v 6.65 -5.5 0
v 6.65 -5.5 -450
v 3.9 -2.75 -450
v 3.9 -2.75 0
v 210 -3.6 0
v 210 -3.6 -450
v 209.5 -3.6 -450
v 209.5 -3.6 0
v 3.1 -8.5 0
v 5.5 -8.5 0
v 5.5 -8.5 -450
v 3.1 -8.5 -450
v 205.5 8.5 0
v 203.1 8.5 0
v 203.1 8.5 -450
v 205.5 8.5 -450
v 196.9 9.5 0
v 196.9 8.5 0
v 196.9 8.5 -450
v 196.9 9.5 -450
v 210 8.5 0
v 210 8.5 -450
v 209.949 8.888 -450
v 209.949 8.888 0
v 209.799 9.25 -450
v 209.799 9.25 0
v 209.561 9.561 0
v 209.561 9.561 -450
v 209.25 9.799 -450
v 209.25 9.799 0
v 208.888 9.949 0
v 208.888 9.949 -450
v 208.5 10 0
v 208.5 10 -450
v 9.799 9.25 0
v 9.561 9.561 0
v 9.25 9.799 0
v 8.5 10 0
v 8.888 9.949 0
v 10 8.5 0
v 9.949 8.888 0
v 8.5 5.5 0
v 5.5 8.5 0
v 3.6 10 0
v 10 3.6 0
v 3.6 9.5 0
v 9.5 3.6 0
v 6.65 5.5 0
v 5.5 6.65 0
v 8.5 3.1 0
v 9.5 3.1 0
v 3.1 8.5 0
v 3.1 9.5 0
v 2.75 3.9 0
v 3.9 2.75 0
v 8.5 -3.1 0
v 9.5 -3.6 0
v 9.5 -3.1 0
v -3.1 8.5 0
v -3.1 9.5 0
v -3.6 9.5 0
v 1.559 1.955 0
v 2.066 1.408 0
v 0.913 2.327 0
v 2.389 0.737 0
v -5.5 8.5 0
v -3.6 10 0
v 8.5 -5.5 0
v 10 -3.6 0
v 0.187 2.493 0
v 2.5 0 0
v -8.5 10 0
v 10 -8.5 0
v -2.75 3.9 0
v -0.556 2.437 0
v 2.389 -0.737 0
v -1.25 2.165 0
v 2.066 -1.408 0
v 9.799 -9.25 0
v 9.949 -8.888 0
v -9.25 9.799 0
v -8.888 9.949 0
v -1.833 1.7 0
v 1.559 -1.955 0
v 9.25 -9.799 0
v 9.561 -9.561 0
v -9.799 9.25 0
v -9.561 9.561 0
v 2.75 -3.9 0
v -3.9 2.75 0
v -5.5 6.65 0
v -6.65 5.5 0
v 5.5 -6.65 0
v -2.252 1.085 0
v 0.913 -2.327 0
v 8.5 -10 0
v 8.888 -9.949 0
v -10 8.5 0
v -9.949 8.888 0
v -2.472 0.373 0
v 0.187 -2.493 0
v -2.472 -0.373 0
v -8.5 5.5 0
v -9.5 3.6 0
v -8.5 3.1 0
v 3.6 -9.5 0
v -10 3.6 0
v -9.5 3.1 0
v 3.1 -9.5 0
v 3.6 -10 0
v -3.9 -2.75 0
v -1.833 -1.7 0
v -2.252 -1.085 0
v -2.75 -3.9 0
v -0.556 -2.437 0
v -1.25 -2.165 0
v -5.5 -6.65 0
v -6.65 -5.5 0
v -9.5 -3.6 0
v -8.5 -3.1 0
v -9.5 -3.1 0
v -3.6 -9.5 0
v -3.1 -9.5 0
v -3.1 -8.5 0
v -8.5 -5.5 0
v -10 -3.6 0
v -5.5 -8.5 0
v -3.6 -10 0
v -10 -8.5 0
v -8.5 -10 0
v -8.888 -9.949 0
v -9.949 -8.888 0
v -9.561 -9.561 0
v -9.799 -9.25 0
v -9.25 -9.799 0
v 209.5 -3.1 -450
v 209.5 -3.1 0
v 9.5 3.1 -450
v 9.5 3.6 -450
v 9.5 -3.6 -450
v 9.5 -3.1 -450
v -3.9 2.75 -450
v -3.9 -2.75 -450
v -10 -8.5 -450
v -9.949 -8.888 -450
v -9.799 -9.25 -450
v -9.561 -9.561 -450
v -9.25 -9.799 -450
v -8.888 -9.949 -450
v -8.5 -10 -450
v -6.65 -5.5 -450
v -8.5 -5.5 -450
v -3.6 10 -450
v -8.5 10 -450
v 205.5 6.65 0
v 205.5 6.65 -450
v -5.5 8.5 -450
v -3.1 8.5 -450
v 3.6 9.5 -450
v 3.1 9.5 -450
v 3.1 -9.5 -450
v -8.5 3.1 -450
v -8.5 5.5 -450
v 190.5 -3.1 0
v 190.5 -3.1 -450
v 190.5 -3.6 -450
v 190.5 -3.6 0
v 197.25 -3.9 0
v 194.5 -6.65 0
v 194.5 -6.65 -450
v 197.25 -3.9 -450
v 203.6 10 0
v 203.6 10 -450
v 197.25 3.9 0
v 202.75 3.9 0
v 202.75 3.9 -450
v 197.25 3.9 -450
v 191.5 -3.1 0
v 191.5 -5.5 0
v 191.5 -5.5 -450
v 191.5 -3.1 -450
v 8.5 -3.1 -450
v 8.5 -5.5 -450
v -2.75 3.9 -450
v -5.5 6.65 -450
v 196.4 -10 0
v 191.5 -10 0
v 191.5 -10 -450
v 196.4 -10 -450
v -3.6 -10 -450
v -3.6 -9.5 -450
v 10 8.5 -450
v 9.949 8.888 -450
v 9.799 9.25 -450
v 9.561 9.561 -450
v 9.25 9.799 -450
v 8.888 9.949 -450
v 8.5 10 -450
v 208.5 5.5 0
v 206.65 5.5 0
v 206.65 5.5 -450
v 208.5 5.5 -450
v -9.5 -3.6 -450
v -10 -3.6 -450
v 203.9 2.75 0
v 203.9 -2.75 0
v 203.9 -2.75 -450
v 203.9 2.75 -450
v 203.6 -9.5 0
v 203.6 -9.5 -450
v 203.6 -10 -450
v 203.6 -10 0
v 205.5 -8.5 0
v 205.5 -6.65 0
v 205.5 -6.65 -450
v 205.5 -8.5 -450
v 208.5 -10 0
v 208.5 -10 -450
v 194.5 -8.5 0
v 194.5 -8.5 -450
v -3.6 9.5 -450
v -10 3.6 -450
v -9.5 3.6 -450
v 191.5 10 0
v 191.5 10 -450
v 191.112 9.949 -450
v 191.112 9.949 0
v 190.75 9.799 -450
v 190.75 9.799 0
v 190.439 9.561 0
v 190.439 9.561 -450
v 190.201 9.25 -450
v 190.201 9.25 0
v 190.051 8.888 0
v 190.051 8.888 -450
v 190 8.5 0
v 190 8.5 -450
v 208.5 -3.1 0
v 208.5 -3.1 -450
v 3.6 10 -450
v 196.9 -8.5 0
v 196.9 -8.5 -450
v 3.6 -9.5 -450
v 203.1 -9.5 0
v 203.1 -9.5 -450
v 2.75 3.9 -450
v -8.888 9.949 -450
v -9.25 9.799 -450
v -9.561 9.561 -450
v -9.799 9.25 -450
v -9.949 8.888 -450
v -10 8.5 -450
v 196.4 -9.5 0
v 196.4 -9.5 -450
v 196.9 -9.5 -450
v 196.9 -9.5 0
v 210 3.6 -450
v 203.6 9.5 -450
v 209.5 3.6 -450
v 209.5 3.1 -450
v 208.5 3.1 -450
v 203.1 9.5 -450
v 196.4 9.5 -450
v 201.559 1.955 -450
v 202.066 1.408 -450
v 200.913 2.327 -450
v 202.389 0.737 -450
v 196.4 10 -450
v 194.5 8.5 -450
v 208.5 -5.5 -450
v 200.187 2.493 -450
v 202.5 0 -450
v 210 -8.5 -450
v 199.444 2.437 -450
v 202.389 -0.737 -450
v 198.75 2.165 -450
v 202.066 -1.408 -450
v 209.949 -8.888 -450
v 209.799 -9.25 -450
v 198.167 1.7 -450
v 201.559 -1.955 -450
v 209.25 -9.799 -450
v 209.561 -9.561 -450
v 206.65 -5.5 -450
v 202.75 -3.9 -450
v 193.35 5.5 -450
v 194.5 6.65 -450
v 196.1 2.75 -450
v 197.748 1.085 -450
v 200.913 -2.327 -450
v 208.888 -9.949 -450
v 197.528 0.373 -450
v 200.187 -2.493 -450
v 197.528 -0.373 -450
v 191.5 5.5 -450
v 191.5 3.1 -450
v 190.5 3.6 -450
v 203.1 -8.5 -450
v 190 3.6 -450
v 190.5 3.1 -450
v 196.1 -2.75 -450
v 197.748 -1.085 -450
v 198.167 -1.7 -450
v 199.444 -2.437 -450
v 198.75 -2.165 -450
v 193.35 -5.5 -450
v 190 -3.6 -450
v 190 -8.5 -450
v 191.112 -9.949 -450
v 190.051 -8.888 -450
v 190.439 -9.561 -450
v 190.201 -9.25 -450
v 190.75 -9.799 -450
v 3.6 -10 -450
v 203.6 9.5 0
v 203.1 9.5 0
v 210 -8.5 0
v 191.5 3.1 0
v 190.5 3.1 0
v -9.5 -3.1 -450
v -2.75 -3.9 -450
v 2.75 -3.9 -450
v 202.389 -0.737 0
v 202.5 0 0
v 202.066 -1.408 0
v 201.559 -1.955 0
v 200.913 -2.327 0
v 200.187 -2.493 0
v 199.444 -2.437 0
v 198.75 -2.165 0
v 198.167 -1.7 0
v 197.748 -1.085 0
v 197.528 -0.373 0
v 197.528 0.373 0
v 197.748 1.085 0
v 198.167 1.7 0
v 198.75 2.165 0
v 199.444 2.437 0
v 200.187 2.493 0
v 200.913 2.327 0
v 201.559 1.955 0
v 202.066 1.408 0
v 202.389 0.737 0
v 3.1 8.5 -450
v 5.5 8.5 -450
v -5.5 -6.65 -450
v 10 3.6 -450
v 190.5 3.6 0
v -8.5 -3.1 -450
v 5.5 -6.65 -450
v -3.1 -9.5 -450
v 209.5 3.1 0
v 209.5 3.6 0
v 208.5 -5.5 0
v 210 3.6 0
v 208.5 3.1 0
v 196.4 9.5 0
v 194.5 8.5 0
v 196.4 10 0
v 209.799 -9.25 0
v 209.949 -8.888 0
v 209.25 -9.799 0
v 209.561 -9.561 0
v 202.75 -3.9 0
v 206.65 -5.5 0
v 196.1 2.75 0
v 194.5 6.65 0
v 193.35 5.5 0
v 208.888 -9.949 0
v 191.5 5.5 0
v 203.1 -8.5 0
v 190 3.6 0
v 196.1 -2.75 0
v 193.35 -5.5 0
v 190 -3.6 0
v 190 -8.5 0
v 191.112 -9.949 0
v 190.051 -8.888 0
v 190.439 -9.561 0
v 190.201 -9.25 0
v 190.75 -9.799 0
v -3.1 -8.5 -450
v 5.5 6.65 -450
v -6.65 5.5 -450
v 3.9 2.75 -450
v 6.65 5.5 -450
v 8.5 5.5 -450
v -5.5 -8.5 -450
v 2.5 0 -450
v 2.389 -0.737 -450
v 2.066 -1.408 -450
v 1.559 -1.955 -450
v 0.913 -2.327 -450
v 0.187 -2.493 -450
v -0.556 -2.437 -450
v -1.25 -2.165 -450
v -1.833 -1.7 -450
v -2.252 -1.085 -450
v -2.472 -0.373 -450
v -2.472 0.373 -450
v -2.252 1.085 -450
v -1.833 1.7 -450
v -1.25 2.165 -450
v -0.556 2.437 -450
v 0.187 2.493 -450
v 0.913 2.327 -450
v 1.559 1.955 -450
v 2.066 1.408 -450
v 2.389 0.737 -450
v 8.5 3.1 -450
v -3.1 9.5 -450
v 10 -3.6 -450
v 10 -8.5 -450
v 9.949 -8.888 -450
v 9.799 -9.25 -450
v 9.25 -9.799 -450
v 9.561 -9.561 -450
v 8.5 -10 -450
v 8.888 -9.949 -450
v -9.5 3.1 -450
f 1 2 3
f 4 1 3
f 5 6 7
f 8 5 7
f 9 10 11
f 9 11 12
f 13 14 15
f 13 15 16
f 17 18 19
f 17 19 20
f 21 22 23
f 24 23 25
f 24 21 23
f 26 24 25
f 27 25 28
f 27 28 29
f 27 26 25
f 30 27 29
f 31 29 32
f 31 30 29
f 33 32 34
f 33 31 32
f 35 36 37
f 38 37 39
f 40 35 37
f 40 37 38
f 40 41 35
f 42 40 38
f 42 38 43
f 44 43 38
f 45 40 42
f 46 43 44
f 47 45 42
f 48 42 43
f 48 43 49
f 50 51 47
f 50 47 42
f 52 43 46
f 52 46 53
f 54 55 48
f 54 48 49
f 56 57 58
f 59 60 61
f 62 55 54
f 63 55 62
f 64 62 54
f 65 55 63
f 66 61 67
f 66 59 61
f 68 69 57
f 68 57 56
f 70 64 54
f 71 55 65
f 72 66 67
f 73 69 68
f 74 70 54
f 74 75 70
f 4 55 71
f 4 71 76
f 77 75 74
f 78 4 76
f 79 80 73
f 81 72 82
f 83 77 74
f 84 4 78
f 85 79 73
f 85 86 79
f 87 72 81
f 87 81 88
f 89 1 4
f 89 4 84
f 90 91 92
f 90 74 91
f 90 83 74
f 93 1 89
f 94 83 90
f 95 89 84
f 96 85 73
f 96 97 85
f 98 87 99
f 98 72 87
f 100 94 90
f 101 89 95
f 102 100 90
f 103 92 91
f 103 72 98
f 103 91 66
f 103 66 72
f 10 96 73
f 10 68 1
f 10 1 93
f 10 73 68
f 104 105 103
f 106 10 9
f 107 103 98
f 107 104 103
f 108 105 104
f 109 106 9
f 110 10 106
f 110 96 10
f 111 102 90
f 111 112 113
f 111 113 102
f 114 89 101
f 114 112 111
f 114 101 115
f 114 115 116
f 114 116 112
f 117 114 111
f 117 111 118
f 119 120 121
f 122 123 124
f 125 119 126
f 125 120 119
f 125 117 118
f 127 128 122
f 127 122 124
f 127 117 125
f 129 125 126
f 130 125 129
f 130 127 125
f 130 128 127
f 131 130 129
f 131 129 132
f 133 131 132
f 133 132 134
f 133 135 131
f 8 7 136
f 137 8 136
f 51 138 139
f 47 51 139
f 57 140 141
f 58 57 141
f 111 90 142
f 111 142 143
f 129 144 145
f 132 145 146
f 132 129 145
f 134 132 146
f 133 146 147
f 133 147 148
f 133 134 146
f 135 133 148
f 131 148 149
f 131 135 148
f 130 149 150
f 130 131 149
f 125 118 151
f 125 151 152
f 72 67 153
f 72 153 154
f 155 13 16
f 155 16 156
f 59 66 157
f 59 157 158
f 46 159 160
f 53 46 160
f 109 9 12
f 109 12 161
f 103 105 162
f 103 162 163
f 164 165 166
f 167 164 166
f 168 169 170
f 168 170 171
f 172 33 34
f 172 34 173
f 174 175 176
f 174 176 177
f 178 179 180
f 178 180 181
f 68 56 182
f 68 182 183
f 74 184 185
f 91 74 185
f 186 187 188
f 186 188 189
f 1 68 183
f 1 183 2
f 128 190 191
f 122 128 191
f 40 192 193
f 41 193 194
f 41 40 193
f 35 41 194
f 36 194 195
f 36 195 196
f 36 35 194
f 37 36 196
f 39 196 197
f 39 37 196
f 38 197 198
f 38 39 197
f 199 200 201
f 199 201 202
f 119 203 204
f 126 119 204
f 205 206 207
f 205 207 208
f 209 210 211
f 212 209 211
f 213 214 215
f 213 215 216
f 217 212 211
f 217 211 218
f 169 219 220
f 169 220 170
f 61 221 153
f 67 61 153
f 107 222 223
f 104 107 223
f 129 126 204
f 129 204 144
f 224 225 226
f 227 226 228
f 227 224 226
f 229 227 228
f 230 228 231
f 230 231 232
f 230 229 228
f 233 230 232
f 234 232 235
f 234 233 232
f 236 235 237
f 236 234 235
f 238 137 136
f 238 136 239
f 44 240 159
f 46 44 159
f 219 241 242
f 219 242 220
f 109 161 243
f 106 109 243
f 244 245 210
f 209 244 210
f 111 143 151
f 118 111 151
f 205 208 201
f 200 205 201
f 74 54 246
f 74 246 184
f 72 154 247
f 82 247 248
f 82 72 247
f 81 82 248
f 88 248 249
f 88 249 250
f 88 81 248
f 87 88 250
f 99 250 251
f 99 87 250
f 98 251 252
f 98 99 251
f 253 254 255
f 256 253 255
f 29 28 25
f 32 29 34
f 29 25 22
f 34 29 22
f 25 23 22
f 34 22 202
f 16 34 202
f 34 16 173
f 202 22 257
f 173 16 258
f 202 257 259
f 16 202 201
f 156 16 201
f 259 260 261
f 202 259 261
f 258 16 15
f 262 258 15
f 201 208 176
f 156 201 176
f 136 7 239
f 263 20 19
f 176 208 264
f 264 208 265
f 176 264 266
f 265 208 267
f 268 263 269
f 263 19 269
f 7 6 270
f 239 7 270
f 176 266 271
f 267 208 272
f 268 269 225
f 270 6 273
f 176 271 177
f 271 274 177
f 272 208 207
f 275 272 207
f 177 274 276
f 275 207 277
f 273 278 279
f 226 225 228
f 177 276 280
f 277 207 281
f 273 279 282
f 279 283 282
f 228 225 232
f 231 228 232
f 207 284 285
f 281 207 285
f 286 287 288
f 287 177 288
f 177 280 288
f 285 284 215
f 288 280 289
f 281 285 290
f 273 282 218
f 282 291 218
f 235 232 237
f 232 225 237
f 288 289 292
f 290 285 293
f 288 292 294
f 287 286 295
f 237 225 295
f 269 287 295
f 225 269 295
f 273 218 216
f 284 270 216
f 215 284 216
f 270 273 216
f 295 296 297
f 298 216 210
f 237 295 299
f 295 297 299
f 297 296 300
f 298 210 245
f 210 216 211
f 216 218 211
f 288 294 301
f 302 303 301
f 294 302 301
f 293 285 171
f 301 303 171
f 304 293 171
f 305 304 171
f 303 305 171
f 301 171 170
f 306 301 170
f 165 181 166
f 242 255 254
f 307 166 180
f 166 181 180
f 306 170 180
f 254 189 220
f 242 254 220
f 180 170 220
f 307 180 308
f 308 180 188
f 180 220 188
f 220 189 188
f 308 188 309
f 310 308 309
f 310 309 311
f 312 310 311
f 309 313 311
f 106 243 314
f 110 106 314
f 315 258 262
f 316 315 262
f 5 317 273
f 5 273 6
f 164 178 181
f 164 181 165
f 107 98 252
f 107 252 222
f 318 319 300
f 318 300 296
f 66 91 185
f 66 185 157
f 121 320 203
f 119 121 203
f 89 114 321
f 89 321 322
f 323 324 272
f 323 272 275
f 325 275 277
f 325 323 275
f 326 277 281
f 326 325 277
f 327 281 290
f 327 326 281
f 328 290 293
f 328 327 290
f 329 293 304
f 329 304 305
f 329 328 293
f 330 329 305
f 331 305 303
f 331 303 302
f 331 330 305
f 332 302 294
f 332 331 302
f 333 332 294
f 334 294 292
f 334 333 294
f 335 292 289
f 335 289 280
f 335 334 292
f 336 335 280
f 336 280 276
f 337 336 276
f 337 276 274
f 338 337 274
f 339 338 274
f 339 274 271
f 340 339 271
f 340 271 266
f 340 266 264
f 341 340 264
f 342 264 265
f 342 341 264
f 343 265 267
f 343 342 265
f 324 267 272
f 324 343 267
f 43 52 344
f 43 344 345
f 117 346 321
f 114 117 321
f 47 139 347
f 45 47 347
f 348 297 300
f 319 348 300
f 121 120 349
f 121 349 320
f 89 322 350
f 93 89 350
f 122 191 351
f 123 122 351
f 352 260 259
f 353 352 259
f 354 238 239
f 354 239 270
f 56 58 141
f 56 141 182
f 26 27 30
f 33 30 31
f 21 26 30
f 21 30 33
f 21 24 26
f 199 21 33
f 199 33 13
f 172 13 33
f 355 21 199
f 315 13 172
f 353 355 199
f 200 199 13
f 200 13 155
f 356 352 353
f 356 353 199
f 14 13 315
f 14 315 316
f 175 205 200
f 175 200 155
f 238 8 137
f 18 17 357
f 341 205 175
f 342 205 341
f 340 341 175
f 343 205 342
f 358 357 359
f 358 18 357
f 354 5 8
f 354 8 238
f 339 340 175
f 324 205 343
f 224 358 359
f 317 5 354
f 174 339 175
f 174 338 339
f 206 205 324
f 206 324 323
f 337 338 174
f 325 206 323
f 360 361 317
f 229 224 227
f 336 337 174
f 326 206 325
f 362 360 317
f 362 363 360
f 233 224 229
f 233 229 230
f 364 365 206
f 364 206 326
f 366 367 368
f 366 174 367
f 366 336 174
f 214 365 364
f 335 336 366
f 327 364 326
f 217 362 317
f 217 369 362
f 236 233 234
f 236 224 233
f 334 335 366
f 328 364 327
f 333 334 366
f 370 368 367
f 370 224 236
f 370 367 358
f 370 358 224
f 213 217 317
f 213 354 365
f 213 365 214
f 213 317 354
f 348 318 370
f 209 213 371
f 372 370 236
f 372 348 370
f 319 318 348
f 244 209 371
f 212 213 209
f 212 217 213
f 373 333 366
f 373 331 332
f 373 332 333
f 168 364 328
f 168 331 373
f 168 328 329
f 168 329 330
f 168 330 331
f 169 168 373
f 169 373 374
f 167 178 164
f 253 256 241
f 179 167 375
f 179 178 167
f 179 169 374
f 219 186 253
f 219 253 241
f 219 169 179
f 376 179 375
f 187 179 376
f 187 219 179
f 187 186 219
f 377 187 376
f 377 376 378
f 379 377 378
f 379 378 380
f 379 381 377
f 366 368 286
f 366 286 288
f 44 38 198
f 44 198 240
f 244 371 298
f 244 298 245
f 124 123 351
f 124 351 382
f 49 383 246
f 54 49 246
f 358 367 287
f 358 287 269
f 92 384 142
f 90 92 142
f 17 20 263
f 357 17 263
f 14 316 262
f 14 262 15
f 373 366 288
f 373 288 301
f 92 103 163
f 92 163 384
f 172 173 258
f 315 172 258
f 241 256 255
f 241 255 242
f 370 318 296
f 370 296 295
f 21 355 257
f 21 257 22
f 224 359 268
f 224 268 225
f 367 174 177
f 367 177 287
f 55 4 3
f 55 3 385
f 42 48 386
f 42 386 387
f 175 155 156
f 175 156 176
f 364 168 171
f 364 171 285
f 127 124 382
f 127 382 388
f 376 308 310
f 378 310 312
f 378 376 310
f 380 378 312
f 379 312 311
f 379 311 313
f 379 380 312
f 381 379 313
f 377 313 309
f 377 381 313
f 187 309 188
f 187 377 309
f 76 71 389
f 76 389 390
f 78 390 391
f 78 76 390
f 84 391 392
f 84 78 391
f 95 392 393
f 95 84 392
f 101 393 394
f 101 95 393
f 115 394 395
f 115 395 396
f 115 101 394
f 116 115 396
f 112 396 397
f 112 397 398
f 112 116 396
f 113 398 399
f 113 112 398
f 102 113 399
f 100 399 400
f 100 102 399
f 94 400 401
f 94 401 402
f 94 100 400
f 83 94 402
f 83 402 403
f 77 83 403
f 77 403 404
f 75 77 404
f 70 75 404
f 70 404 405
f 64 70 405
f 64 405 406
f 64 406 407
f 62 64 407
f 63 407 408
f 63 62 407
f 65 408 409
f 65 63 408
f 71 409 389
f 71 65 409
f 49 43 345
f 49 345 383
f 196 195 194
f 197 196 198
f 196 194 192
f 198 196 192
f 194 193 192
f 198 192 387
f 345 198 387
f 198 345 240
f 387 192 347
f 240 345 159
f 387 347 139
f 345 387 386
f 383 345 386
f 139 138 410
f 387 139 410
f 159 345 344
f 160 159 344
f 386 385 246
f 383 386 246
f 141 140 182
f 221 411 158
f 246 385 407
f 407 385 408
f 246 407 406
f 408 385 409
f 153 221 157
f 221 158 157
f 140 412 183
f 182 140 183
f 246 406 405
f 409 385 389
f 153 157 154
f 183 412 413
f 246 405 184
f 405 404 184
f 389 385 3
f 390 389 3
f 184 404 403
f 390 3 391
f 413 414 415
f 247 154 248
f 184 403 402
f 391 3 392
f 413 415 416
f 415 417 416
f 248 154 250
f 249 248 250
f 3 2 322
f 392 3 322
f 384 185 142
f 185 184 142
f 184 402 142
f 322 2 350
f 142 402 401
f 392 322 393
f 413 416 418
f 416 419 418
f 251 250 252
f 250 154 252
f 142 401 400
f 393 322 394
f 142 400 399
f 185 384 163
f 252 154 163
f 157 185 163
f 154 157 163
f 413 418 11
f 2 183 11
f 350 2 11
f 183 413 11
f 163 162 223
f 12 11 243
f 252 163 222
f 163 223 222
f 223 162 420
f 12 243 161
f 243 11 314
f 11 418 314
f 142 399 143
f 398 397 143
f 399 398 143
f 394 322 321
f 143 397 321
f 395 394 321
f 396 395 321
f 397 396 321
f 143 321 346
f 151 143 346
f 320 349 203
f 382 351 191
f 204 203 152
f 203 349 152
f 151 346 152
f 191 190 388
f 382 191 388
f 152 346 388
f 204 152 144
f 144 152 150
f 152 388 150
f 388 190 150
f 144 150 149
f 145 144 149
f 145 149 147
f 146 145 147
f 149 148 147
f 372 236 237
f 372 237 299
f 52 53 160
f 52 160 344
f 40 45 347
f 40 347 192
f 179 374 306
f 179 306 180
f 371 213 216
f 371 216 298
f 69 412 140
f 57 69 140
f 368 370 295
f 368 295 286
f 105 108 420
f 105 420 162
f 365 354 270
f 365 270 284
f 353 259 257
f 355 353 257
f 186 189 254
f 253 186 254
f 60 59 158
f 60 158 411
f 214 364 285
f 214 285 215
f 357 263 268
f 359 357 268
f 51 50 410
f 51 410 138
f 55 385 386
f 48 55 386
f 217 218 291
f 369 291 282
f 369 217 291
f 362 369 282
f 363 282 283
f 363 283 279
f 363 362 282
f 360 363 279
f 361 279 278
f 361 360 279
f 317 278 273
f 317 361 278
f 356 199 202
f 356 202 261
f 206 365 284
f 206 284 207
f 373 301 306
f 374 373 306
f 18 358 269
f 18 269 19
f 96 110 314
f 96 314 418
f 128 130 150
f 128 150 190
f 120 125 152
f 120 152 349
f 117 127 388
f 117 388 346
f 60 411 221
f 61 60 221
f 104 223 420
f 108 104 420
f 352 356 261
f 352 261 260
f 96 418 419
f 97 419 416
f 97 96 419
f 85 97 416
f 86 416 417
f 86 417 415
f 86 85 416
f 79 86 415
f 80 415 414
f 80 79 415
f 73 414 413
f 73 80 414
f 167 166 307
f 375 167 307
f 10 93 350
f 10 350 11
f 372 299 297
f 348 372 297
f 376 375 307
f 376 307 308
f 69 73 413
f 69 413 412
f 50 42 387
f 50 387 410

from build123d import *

# Parameters (mm, degrees)
SKETCH1_R                  = 2.5
F_20_X_20_X_R1_5_1_DEPTH   = 450
SKETCH1_ON_SEGMENT_2_R     = 2.5
F_20_X_20_X_R1_5_1_2_DEPTH = 450


with BuildPart() as part:
    # Sketch1 → 工业铝型材 20 X 20 X R1.5(1) (new body)
    with BuildSketch(Plane(origin=(0, 0, 0), x_dir=(1, 0, 0), z_dir=(0, 0, -1))):
        with BuildLine():
            Line((-3.6, 10), (-3.6, 9.5))
            Line((-3.6, 9.5), (-3.1, 9.5))
            Line((-3.1, 9.5), (-3.1, 8.5))
            Line((-3.1, 8.5), (-5.5, 8.5))
            Line((-5.5, 8.5), (-5.5, 6.65))
            Line((-5.5, 6.65), (-2.75, 3.9))
            Line((-2.75, 3.9), (2.75, 3.9))
            Line((2.75, 3.9), (5.5, 6.65))
            Line((5.5, 6.65), (5.5, 8.5))
            Line((5.5, 8.5), (3.1, 8.5))
            Line((3.1, 8.5), (3.1, 9.5))
            Line((3.1, 9.5), (3.6, 9.5))
            Line((3.6, 9.5), (3.6, 10))
            Line((3.6, 10), (8.5, 10))
            ThreePointArc((8.5, 10), (9.560660172, 9.560660172), (10, 8.5))
            Line((10, 8.5), (10, 3.6))
            Line((10, 3.6), (9.5, 3.6))
            Line((9.5, 3.6), (9.5, 3.1))
            Line((9.5, 3.1), (8.5, 3.1))
            Line((8.5, 3.1), (8.5, 5.5))
            Line((8.5, 5.5), (6.65, 5.5))
            Line((6.65, 5.5), (3.9, 2.75))
            Line((3.9, 2.75), (3.9, -2.75))
            Line((3.9, -2.75), (6.65, -5.5))
            Line((6.65, -5.5), (8.5, -5.5))
            Line((8.5, -5.5), (8.5, -3.1))
            Line((8.5, -3.1), (9.5, -3.1))
            Line((9.5, -3.1), (9.5, -3.6))
            Line((9.5, -3.6), (10, -3.6))
            Line((10, -3.6), (10, -8.5))
            ThreePointArc((10, -8.5), (9.560660172, -9.560660172), (8.5, -10))
            Line((8.5, -10), (3.6, -10))
            Line((3.6, -10), (3.6, -9.5))
            Line((3.6, -9.5), (3.1, -9.5))
            Line((3.1, -9.5), (3.1, -8.5))
            Line((3.1, -8.5), (5.5, -8.5))
            Line((5.5, -8.5), (5.5, -6.65))
            Line((5.5, -6.65), (2.75, -3.9))
            Line((2.75, -3.9), (-2.75, -3.9))
            Line((-2.75, -3.9), (-5.5, -6.65))
            Line((-5.5, -6.65), (-5.5, -8.5))
            Line((-5.5, -8.5), (-3.1, -8.5))
            Line((-3.1, -8.5), (-3.1, -9.5))
            Line((-3.1, -9.5), (-3.6, -9.5))
            Line((-3.6, -9.5), (-3.6, -10))
            Line((-3.6, -10), (-8.5, -10))
            ThreePointArc((-8.5, -10), (-9.560660172, -9.560660172), (-10, -8.5))
            Line((-10, -8.5), (-10, -3.6))
            Line((-10, -3.6), (-9.5, -3.6))
            Line((-9.5, -3.6), (-9.5, -3.1))
            Line((-9.5, -3.1), (-8.5, -3.1))
            Line((-8.5, -3.1), (-8.5, -5.5))
            Line((-8.5, -5.5), (-6.65, -5.5))
            Line((-6.65, -5.5), (-3.9, -2.75))
            Line((-3.9, -2.75), (-3.9, 2.75))
            Line((-3.9, 2.75), (-6.65, 5.5))
            Line((-6.65, 5.5), (-8.5, 5.5))
            Line((-8.5, 5.5), (-8.5, 3.1))
            Line((-8.5, 3.1), (-9.5, 3.1))
            Line((-9.5, 3.1), (-9.5, 3.6))
            Line((-9.5, 3.6), (-10, 3.6))
            Line((-10, 3.6), (-10, 8.5))
            ThreePointArc((-10, 8.5), (-9.560660172, 9.560660172), (-8.5, 10))
            Line((-8.5, 10), (-3.6, 10))
        make_face()
        Circle(SKETCH1_R, mode=Mode.SUBTRACT)
    extrude(amount=F_20_X_20_X_R1_5_1_DEPTH)


with BuildPart() as body_2:
    # Sketch1 on segment 2 (carried to segment 2) → 20 X 20 X R1.5_1 2 (new body)
    with BuildSketch(Plane(origin=(200, 0, 0), x_dir=(1, 0, 0), z_dir=(0, 0, -1))):
        with BuildLine():
            Line((-3.6, 10), (-3.6, 9.5))
            Line((-3.6, 9.5), (-3.1, 9.5))
            Line((-3.1, 9.5), (-3.1, 8.5))
            Line((-3.1, 8.5), (-5.5, 8.5))
            Line((-5.5, 8.5), (-5.5, 6.65))
            Line((-5.5, 6.65), (-2.75, 3.9))
            Line((-2.75, 3.9), (2.75, 3.9))
            Line((2.75, 3.9), (5.5, 6.65))
            Line((5.5, 6.65), (5.5, 8.5))
            Line((5.5, 8.5), (3.1, 8.5))
            Line((3.1, 8.5), (3.1, 9.5))
            Line((3.1, 9.5), (3.6, 9.5))
            Line((3.6, 9.5), (3.6, 10))
            Line((3.6, 10), (8.5, 10))
            ThreePointArc((8.5, 10), (9.560660172, 9.560660172), (10, 8.5))
            Line((10, 8.5), (10, 3.6))
            Line((10, 3.6), (9.5, 3.6))
            Line((9.5, 3.6), (9.5, 3.1))
            Line((9.5, 3.1), (8.5, 3.1))
            Line((8.5, 3.1), (8.5, 5.5))
            Line((8.5, 5.5), (6.65, 5.5))
            Line((6.65, 5.5), (3.9, 2.75))
            Line((3.9, 2.75), (3.9, -2.75))
            Line((3.9, -2.75), (6.65, -5.5))
            Line((6.65, -5.5), (8.5, -5.5))
            Line((8.5, -5.5), (8.5, -3.1))
            Line((8.5, -3.1), (9.5, -3.1))
            Line((9.5, -3.1), (9.5, -3.6))
            Line((9.5, -3.6), (10, -3.6))
            Line((10, -3.6), (10, -8.5))
            ThreePointArc((10, -8.5), (9.560660172, -9.560660172), (8.5, -10))
            Line((8.5, -10), (3.6, -10))
            Line((3.6, -10), (3.6, -9.5))
            Line((3.6, -9.5), (3.1, -9.5))
            Line((3.1, -9.5), (3.1, -8.5))
            Line((3.1, -8.5), (5.5, -8.5))
            Line((5.5, -8.5), (5.5, -6.65))
            Line((5.5, -6.65), (2.75, -3.9))
            Line((2.75, -3.9), (-2.75, -3.9))
            Line((-2.75, -3.9), (-5.5, -6.65))
            Line((-5.5, -6.65), (-5.5, -8.5))
            Line((-5.5, -8.5), (-3.1, -8.5))
            Line((-3.1, -8.5), (-3.1, -9.5))
            Line((-3.1, -9.5), (-3.6, -9.5))
            Line((-3.6, -9.5), (-3.6, -10))
            Line((-3.6, -10), (-8.5, -10))
            ThreePointArc((-8.5, -10), (-9.560660172, -9.560660172), (-10, -8.5))
            Line((-10, -8.5), (-10, -3.6))
            Line((-10, -3.6), (-9.5, -3.6))
            Line((-9.5, -3.6), (-9.5, -3.1))
            Line((-9.5, -3.1), (-8.5, -3.1))
            Line((-8.5, -3.1), (-8.5, -5.5))
            Line((-8.5, -5.5), (-6.65, -5.5))
            Line((-6.65, -5.5), (-3.9, -2.75))
            Line((-3.9, -2.75), (-3.9, 2.75))
            Line((-3.9, 2.75), (-6.65, 5.5))
            Line((-6.65, 5.5), (-8.5, 5.5))
            Line((-8.5, 5.5), (-8.5, 3.1))
            Line((-8.5, 3.1), (-9.5, 3.1))
            Line((-9.5, 3.1), (-9.5, 3.6))
            Line((-9.5, 3.6), (-10, 3.6))
            Line((-10, 3.6), (-10, 8.5))
            ThreePointArc((-10, 8.5), (-9.560660172, 9.560660172), (-8.5, 10))
            Line((-8.5, 10), (-3.6, 10))
        make_face()
        Circle(SKETCH1_ON_SEGMENT_2_R, mode=Mode.SUBTRACT)
    extrude(amount=F_20_X_20_X_R1_5_1_2_DEPTH)


solid = Compound([part.part, body_2.part])
